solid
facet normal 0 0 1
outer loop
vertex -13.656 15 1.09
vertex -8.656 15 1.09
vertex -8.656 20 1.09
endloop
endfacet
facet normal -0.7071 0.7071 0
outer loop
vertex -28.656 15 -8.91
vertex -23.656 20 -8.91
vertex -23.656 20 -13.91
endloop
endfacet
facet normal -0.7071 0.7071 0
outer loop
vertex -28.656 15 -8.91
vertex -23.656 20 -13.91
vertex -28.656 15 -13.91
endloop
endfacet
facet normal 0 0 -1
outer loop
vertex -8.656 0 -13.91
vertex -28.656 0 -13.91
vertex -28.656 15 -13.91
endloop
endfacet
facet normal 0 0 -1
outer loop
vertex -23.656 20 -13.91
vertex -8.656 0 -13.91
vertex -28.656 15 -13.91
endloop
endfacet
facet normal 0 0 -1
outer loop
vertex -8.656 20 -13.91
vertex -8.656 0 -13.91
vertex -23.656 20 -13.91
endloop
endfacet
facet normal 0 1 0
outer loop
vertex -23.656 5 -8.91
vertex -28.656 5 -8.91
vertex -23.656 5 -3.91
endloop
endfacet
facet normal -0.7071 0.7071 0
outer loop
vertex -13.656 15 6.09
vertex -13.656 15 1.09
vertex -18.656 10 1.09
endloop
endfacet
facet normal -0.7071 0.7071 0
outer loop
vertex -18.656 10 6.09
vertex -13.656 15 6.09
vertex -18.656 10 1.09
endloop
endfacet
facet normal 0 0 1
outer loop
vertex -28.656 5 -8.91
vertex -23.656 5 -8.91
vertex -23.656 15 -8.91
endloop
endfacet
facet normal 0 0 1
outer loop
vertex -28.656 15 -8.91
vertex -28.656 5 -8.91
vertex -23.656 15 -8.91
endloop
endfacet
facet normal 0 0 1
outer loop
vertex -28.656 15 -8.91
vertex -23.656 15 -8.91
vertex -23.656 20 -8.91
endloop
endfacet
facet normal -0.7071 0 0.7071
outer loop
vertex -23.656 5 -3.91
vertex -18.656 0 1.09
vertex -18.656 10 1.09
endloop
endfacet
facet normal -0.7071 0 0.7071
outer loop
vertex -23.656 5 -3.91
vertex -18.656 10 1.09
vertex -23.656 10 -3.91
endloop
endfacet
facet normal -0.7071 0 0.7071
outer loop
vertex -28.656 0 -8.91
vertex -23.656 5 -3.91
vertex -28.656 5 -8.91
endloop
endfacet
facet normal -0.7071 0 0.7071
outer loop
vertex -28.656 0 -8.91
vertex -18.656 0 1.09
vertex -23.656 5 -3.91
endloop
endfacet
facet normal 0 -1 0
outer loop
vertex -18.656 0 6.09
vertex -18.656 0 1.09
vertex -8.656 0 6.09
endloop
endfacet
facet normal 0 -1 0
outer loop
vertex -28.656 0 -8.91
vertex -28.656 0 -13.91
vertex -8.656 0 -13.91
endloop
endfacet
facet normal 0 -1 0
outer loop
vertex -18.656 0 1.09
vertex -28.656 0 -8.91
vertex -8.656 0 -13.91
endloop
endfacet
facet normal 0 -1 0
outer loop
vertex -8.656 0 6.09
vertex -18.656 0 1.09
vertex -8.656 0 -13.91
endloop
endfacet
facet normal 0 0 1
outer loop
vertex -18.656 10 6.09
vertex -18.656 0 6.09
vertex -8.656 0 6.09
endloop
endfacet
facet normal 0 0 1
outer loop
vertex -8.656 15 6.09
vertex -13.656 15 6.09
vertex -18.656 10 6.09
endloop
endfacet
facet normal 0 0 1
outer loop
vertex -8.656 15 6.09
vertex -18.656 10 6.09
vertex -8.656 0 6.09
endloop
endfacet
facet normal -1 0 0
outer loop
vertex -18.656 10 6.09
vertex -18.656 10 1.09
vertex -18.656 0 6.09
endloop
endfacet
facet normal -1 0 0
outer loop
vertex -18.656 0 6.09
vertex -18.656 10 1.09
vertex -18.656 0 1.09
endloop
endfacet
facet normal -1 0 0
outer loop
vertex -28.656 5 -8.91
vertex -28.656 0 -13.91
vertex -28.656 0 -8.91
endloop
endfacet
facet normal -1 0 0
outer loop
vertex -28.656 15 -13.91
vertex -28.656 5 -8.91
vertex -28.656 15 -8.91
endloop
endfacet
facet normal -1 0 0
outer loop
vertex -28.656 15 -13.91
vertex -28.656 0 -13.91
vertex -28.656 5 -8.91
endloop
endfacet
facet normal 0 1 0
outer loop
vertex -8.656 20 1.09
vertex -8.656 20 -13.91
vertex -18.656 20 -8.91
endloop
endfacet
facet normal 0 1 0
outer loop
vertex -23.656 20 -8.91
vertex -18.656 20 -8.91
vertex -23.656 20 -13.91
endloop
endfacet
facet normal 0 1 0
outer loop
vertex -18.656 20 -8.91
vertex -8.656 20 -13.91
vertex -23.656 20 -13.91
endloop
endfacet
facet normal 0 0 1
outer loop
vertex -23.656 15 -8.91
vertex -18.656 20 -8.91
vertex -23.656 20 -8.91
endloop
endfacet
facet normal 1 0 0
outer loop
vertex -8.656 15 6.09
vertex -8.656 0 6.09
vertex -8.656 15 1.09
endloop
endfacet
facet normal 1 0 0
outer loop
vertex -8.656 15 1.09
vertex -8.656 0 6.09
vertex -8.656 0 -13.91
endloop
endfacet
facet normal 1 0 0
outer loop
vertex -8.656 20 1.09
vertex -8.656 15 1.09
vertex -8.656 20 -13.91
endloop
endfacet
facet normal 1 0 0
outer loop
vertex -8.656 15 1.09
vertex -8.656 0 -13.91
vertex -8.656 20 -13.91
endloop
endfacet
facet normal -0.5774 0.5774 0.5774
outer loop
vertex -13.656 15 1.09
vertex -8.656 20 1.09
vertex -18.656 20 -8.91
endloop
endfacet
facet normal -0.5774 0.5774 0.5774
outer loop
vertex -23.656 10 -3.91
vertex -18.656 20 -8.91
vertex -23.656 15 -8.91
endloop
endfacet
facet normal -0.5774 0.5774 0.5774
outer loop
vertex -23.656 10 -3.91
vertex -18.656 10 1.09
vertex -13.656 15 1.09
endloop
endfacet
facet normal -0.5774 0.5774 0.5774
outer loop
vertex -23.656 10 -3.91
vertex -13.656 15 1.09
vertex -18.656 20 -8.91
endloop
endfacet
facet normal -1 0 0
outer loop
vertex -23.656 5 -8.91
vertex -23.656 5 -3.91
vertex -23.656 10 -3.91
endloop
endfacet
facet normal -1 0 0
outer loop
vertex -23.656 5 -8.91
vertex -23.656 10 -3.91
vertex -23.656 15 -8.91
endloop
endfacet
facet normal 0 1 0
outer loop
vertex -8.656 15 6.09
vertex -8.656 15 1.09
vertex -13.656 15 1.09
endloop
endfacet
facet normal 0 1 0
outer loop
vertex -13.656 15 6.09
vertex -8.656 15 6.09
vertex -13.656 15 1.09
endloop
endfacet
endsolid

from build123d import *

# Parameters (mm, degrees)
BOSS_EXTRUDE1_DEPTH = 20
SKETCH2_W           = 5
SKETCH2_H           = 20
BOSS_EXTRUDE2_DEPTH = 5
CUT_EXTRUDE1_DEPTH  = 5
SKETCH4_W           = 5
SKETCH4_H           = 5
BOSS_EXTRUDE3_DEPTH = 5
CUT_EXTRUDE2_DEPTH  = 5
BOSS_EXTRUDE4_DEPTH = 20
CUT_EXTRUDE3_DEPTH  = 20
BOSS_EXTRUDE5_DEPTH = 5


with BuildPart() as part:
    # Sketch1 → Boss-Extrude1 (new body)
    with BuildSketch(Plane(origin=(0, 0, 0), x_dir=(1, 0, 0), z_dir=(0, 1, 0))):
        Polygon((-23.656387665, 13.90969163), (-8.656387665, 13.90969163), (-8.656387665, -1.09030837), (-18.656387665, 8.90969163), (-23.656387665, 8.90969163), align=None)
    extrude(amount=BOSS_EXTRUDE1_DEPTH)

    # Sketch2 → Boss-Extrude2 (add)
    with BuildSketch(Plane.ZY.offset(23.656387665)):
        with Locations((-11.40969163, 10)):
            Rectangle(SKETCH2_W, SKETCH2_H)
    extrude(amount=BOSS_EXTRUDE2_DEPTH)

    # Sketch3 → Cut-Extrude1 (cut)
    with BuildSketch(Plane.XY.offset(-8.90969163)):
        Polygon((-23.656387665, 20), (-28.656387665, 15), (-28.656387665, 20), align=None)
    extrude(amount=-CUT_EXTRUDE1_DEPTH, mode=Mode.SUBTRACT)

    # Sketch4 → Boss-Extrude3 (add)
    with BuildSketch(Plane.XY.offset(-8.90969163)):
        with Locations((-26.156387665, 2.5)):
            Rectangle(SKETCH4_W, SKETCH4_H)
    extrude(amount=BOSS_EXTRUDE3_DEPTH)

    # Sketch5 → Cut-Extrude2 (cut)
    with BuildSketch(Plane(origin=(0, 5, 0), x_dir=(1, 0, 0), z_dir=(0, 1, 0))):
        Polygon((-28.656387665, 8.90969163), (-23.656387665, 3.90969163), (-28.656387665, 3.90969163), align=None)
    extrude(amount=-CUT_EXTRUDE2_DEPTH, mode=Mode.SUBTRACT)

    # Sketch6 → Boss-Extrude4 (add)
    with BuildSketch(Plane(origin=(0, 0, 0), x_dir=(-1, 0, 0), z_dir=(0, -1, 0))):
        Polygon((18.656387665, -1.09030837), (23.656387665, 3.90969163), (23.656387665, 8.90969163), (18.656387665, 8.90969163), (8.656387665, -1.09030837), align=None)
    extrude(amount=-BOSS_EXTRUDE4_DEPTH)

    # 3DSketch1 → Cut-Extrude3 (cut, along a direction that is not the sketch's normal)
    with BuildSketch(Plane(origin=(-8.656387665, 20, 1.09030837), x_dir=(-0.8017837257372731, -0.26726124191242434, -0.5345224838248491), z_dir=(-0.577350269189626, 0.577350269189626, 0.5773502691896256))):
        Polygon((0, 0), (13.363062096, -4.629100499), (18.708286934, 0), (17.371980724, 6.943650748), (10.690449676, 9.258200998), align=None)
    extrude(amount=CUT_EXTRUDE3_DEPTH, dir=(0, 1, 0), mode=Mode.SUBTRACT)

    # Sketch7 → Boss-Extrude5 (add)
    with BuildSketch(Plane.XY.offset(1.09030837)):
        Polygon((-8.656387665, 15), (-13.656387665, 15), (-18.656387665, 10), (-18.656387665, 0), (-8.656387665, 0), align=None)
    extrude(amount=BOSS_EXTRUDE5_DEPTH)


solid = part.part
